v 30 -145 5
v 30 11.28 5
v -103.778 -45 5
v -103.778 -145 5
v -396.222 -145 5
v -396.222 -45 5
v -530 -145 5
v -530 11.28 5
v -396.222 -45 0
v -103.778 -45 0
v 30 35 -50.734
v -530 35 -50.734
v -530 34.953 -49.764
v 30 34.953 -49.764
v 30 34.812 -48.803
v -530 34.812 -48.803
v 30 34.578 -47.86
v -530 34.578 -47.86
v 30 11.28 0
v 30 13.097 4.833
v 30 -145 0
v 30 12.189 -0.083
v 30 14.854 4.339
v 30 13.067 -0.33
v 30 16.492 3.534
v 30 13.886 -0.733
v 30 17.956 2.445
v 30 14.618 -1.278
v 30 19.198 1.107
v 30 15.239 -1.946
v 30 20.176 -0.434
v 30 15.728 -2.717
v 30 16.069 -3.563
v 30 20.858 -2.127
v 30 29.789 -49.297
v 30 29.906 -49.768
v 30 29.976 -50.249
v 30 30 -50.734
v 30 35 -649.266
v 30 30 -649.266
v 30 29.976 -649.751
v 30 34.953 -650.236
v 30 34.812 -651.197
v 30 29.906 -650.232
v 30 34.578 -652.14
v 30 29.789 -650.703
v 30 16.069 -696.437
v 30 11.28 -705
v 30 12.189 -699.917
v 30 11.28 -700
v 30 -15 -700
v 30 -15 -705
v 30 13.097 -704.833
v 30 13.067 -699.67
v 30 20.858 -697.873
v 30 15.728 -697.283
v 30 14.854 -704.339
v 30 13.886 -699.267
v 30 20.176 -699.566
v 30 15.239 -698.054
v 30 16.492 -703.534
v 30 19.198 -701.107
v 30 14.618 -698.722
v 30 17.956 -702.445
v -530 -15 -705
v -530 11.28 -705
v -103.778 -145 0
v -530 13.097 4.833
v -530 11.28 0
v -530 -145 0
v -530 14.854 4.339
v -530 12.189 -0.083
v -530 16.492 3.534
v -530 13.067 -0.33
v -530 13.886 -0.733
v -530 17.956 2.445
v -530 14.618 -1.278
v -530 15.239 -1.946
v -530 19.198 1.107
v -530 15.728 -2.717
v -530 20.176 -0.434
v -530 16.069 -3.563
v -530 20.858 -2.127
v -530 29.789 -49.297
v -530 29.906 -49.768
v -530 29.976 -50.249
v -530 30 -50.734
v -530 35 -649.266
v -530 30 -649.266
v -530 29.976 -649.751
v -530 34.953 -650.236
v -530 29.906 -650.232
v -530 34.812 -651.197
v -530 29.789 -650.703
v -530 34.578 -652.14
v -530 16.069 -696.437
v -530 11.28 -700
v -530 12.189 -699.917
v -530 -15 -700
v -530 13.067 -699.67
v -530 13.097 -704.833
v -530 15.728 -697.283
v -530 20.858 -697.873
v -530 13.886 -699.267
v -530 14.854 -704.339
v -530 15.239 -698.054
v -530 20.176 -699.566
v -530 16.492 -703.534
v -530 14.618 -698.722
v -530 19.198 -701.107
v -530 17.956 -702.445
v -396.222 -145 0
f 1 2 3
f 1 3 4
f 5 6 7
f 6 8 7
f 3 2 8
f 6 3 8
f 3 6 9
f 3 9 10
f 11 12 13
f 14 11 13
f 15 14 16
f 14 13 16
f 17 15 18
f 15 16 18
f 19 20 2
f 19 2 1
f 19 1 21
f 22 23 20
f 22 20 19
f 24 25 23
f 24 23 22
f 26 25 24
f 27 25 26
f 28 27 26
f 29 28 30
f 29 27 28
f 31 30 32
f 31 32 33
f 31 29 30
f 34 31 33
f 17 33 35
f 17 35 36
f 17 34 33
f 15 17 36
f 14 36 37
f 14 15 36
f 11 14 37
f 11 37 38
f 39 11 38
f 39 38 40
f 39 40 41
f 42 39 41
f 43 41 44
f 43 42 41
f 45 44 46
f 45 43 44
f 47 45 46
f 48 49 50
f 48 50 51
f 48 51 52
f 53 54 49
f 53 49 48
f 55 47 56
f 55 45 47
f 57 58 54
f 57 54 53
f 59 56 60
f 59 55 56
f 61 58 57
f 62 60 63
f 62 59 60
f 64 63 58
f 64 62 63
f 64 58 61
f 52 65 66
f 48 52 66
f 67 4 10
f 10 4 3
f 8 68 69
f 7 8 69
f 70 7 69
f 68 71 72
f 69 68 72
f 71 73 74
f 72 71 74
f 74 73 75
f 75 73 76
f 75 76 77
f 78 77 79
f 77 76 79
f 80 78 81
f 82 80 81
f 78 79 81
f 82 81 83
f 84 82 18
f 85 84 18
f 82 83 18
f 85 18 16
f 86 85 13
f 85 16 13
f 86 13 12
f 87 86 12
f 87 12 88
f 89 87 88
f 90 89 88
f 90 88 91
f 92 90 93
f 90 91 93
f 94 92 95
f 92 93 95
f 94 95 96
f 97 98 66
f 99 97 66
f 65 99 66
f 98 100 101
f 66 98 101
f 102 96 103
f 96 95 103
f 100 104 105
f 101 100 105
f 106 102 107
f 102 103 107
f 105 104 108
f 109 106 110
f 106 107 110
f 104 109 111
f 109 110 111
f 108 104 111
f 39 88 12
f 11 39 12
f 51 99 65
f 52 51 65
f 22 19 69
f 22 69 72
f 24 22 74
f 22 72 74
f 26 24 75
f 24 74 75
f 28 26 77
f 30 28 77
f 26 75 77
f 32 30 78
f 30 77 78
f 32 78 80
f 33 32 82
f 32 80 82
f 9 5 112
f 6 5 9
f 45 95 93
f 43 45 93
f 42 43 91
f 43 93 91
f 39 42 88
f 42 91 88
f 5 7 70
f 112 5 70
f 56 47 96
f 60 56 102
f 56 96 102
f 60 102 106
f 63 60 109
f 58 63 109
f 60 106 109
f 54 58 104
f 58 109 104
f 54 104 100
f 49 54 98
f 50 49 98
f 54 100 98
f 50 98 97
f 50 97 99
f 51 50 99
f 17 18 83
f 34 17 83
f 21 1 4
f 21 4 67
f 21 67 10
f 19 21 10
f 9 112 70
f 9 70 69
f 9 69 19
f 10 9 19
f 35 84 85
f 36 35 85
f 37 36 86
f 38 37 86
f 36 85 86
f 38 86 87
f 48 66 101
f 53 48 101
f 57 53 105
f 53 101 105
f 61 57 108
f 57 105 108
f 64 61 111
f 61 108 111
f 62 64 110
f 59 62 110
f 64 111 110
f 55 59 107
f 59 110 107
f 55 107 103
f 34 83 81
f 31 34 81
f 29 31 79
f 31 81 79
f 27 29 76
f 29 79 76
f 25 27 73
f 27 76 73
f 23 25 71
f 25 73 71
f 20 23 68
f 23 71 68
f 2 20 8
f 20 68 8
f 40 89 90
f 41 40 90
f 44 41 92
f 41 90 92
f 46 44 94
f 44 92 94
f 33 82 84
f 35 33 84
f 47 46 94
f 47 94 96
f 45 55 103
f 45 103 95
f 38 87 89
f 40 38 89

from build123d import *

# Parameters (mm, degrees)
BASE_FLANGE1_START = -279.99988
BASE_FLANGE1_DEPTH = 559.99976
SKETCH8_W          = 292.444779068
SKETCH8_H          = 100
CUT_EXTRUDE1_DEPTH = 898.788870169


# Sheet-metal steps are written as plain solids
with BuildPart() as part:
    # Sketch3 → Base-Flange1 (new body)
    with BuildSketch(Plane(origin=(-250, -934.739885498, -1517.780517475), x_dir=(0, 0, -1), z_dir=(1, 0, 0)).offset(BASE_FLANGE1_START)):
        with BuildLine():
            Line((-1517.780517475, 789.739945498), (-1517.780517475, 919.739945498))
            Line((-1517.780517475, 919.739945498), (-1517.780517475, 946.019792244))
            ThreePointArc((-1517.780517475, 946.019792244), (-1516.791982116, 949.004444892), (-1514.217256902, 950.80892367))
            Line((-1514.217256902, 950.80892367), (-1468.483412721, 964.529076924))
            ThreePointArc((-1468.483412721, 964.529076924), (-1467.772739017, 964.686947476), (-1467.046673293, 964.739945498))
            Line((-1467.046673293, 964.739945498), (-868.514361656, 964.739945498))
            ThreePointArc((-868.514361656, 964.739945498), (-867.788295933, 964.686947476), (-867.077622228, 964.529076924))
            Line((-867.077622228, 964.529076924), (-821.343778047, 950.80892367))
            ThreePointArc((-821.343778047, 950.80892367), (-818.769052833, 949.004444892), (-817.780517475, 946.019792244))
            Line((-817.780517475, 946.019792244), (-817.780517475, 919.739945498))
            Line((-817.780517475, 919.739945498), (-812.780517475, 919.739945498))
            Line((-812.780517475, 919.739945498), (-812.780517475, 946.019792244))
            ThreePointArc((-812.780517475, 946.019792244), (-814.757588192, 951.98909754), (-819.907038619, 955.598055096))
            Line((-819.907038619, 955.598055096), (-865.6408828, 969.318208351))
            ThreePointArc((-865.6408828, 969.31820835), (-867.062230209, 969.633949453), (-868.514361657, 969.739945498))
            Line((-868.514361656, 969.739945498), (-1467.046673293, 969.739945498))
            ThreePointArc((-1467.046673294, 969.739945498), (-1468.49880474, 969.633949453), (-1469.920152148, 969.318208351))
            Line((-1469.920152149, 969.318208351), (-1515.65399633, 955.598055096))
            ThreePointArc((-1515.65399633, 955.598055096), (-1520.803446757, 951.98909754), (-1522.780517475, 946.019792244))
            Line((-1522.780517475, 946.019792244), (-1522.780517475, 919.739945498))
            Line((-1522.780517475, 919.739945498), (-1522.780517475, 789.739945498))
            Line((-1522.780517475, 789.739945498), (-1517.780517475, 789.739945498))
        make_face()
    extrude(amount=BASE_FLANGE1_DEPTH)

    # Sketch8 → Cut-Extrude1 (cut, through all)
    with BuildSketch(Plane.XY.offset(5)):
        with Locations((-250, -94.99994)):
            Rectangle(SKETCH8_W, SKETCH8_H)
    extrude(amount=-CUT_EXTRUDE1_DEPTH, mode=Mode.SUBTRACT)


solid = part.part
